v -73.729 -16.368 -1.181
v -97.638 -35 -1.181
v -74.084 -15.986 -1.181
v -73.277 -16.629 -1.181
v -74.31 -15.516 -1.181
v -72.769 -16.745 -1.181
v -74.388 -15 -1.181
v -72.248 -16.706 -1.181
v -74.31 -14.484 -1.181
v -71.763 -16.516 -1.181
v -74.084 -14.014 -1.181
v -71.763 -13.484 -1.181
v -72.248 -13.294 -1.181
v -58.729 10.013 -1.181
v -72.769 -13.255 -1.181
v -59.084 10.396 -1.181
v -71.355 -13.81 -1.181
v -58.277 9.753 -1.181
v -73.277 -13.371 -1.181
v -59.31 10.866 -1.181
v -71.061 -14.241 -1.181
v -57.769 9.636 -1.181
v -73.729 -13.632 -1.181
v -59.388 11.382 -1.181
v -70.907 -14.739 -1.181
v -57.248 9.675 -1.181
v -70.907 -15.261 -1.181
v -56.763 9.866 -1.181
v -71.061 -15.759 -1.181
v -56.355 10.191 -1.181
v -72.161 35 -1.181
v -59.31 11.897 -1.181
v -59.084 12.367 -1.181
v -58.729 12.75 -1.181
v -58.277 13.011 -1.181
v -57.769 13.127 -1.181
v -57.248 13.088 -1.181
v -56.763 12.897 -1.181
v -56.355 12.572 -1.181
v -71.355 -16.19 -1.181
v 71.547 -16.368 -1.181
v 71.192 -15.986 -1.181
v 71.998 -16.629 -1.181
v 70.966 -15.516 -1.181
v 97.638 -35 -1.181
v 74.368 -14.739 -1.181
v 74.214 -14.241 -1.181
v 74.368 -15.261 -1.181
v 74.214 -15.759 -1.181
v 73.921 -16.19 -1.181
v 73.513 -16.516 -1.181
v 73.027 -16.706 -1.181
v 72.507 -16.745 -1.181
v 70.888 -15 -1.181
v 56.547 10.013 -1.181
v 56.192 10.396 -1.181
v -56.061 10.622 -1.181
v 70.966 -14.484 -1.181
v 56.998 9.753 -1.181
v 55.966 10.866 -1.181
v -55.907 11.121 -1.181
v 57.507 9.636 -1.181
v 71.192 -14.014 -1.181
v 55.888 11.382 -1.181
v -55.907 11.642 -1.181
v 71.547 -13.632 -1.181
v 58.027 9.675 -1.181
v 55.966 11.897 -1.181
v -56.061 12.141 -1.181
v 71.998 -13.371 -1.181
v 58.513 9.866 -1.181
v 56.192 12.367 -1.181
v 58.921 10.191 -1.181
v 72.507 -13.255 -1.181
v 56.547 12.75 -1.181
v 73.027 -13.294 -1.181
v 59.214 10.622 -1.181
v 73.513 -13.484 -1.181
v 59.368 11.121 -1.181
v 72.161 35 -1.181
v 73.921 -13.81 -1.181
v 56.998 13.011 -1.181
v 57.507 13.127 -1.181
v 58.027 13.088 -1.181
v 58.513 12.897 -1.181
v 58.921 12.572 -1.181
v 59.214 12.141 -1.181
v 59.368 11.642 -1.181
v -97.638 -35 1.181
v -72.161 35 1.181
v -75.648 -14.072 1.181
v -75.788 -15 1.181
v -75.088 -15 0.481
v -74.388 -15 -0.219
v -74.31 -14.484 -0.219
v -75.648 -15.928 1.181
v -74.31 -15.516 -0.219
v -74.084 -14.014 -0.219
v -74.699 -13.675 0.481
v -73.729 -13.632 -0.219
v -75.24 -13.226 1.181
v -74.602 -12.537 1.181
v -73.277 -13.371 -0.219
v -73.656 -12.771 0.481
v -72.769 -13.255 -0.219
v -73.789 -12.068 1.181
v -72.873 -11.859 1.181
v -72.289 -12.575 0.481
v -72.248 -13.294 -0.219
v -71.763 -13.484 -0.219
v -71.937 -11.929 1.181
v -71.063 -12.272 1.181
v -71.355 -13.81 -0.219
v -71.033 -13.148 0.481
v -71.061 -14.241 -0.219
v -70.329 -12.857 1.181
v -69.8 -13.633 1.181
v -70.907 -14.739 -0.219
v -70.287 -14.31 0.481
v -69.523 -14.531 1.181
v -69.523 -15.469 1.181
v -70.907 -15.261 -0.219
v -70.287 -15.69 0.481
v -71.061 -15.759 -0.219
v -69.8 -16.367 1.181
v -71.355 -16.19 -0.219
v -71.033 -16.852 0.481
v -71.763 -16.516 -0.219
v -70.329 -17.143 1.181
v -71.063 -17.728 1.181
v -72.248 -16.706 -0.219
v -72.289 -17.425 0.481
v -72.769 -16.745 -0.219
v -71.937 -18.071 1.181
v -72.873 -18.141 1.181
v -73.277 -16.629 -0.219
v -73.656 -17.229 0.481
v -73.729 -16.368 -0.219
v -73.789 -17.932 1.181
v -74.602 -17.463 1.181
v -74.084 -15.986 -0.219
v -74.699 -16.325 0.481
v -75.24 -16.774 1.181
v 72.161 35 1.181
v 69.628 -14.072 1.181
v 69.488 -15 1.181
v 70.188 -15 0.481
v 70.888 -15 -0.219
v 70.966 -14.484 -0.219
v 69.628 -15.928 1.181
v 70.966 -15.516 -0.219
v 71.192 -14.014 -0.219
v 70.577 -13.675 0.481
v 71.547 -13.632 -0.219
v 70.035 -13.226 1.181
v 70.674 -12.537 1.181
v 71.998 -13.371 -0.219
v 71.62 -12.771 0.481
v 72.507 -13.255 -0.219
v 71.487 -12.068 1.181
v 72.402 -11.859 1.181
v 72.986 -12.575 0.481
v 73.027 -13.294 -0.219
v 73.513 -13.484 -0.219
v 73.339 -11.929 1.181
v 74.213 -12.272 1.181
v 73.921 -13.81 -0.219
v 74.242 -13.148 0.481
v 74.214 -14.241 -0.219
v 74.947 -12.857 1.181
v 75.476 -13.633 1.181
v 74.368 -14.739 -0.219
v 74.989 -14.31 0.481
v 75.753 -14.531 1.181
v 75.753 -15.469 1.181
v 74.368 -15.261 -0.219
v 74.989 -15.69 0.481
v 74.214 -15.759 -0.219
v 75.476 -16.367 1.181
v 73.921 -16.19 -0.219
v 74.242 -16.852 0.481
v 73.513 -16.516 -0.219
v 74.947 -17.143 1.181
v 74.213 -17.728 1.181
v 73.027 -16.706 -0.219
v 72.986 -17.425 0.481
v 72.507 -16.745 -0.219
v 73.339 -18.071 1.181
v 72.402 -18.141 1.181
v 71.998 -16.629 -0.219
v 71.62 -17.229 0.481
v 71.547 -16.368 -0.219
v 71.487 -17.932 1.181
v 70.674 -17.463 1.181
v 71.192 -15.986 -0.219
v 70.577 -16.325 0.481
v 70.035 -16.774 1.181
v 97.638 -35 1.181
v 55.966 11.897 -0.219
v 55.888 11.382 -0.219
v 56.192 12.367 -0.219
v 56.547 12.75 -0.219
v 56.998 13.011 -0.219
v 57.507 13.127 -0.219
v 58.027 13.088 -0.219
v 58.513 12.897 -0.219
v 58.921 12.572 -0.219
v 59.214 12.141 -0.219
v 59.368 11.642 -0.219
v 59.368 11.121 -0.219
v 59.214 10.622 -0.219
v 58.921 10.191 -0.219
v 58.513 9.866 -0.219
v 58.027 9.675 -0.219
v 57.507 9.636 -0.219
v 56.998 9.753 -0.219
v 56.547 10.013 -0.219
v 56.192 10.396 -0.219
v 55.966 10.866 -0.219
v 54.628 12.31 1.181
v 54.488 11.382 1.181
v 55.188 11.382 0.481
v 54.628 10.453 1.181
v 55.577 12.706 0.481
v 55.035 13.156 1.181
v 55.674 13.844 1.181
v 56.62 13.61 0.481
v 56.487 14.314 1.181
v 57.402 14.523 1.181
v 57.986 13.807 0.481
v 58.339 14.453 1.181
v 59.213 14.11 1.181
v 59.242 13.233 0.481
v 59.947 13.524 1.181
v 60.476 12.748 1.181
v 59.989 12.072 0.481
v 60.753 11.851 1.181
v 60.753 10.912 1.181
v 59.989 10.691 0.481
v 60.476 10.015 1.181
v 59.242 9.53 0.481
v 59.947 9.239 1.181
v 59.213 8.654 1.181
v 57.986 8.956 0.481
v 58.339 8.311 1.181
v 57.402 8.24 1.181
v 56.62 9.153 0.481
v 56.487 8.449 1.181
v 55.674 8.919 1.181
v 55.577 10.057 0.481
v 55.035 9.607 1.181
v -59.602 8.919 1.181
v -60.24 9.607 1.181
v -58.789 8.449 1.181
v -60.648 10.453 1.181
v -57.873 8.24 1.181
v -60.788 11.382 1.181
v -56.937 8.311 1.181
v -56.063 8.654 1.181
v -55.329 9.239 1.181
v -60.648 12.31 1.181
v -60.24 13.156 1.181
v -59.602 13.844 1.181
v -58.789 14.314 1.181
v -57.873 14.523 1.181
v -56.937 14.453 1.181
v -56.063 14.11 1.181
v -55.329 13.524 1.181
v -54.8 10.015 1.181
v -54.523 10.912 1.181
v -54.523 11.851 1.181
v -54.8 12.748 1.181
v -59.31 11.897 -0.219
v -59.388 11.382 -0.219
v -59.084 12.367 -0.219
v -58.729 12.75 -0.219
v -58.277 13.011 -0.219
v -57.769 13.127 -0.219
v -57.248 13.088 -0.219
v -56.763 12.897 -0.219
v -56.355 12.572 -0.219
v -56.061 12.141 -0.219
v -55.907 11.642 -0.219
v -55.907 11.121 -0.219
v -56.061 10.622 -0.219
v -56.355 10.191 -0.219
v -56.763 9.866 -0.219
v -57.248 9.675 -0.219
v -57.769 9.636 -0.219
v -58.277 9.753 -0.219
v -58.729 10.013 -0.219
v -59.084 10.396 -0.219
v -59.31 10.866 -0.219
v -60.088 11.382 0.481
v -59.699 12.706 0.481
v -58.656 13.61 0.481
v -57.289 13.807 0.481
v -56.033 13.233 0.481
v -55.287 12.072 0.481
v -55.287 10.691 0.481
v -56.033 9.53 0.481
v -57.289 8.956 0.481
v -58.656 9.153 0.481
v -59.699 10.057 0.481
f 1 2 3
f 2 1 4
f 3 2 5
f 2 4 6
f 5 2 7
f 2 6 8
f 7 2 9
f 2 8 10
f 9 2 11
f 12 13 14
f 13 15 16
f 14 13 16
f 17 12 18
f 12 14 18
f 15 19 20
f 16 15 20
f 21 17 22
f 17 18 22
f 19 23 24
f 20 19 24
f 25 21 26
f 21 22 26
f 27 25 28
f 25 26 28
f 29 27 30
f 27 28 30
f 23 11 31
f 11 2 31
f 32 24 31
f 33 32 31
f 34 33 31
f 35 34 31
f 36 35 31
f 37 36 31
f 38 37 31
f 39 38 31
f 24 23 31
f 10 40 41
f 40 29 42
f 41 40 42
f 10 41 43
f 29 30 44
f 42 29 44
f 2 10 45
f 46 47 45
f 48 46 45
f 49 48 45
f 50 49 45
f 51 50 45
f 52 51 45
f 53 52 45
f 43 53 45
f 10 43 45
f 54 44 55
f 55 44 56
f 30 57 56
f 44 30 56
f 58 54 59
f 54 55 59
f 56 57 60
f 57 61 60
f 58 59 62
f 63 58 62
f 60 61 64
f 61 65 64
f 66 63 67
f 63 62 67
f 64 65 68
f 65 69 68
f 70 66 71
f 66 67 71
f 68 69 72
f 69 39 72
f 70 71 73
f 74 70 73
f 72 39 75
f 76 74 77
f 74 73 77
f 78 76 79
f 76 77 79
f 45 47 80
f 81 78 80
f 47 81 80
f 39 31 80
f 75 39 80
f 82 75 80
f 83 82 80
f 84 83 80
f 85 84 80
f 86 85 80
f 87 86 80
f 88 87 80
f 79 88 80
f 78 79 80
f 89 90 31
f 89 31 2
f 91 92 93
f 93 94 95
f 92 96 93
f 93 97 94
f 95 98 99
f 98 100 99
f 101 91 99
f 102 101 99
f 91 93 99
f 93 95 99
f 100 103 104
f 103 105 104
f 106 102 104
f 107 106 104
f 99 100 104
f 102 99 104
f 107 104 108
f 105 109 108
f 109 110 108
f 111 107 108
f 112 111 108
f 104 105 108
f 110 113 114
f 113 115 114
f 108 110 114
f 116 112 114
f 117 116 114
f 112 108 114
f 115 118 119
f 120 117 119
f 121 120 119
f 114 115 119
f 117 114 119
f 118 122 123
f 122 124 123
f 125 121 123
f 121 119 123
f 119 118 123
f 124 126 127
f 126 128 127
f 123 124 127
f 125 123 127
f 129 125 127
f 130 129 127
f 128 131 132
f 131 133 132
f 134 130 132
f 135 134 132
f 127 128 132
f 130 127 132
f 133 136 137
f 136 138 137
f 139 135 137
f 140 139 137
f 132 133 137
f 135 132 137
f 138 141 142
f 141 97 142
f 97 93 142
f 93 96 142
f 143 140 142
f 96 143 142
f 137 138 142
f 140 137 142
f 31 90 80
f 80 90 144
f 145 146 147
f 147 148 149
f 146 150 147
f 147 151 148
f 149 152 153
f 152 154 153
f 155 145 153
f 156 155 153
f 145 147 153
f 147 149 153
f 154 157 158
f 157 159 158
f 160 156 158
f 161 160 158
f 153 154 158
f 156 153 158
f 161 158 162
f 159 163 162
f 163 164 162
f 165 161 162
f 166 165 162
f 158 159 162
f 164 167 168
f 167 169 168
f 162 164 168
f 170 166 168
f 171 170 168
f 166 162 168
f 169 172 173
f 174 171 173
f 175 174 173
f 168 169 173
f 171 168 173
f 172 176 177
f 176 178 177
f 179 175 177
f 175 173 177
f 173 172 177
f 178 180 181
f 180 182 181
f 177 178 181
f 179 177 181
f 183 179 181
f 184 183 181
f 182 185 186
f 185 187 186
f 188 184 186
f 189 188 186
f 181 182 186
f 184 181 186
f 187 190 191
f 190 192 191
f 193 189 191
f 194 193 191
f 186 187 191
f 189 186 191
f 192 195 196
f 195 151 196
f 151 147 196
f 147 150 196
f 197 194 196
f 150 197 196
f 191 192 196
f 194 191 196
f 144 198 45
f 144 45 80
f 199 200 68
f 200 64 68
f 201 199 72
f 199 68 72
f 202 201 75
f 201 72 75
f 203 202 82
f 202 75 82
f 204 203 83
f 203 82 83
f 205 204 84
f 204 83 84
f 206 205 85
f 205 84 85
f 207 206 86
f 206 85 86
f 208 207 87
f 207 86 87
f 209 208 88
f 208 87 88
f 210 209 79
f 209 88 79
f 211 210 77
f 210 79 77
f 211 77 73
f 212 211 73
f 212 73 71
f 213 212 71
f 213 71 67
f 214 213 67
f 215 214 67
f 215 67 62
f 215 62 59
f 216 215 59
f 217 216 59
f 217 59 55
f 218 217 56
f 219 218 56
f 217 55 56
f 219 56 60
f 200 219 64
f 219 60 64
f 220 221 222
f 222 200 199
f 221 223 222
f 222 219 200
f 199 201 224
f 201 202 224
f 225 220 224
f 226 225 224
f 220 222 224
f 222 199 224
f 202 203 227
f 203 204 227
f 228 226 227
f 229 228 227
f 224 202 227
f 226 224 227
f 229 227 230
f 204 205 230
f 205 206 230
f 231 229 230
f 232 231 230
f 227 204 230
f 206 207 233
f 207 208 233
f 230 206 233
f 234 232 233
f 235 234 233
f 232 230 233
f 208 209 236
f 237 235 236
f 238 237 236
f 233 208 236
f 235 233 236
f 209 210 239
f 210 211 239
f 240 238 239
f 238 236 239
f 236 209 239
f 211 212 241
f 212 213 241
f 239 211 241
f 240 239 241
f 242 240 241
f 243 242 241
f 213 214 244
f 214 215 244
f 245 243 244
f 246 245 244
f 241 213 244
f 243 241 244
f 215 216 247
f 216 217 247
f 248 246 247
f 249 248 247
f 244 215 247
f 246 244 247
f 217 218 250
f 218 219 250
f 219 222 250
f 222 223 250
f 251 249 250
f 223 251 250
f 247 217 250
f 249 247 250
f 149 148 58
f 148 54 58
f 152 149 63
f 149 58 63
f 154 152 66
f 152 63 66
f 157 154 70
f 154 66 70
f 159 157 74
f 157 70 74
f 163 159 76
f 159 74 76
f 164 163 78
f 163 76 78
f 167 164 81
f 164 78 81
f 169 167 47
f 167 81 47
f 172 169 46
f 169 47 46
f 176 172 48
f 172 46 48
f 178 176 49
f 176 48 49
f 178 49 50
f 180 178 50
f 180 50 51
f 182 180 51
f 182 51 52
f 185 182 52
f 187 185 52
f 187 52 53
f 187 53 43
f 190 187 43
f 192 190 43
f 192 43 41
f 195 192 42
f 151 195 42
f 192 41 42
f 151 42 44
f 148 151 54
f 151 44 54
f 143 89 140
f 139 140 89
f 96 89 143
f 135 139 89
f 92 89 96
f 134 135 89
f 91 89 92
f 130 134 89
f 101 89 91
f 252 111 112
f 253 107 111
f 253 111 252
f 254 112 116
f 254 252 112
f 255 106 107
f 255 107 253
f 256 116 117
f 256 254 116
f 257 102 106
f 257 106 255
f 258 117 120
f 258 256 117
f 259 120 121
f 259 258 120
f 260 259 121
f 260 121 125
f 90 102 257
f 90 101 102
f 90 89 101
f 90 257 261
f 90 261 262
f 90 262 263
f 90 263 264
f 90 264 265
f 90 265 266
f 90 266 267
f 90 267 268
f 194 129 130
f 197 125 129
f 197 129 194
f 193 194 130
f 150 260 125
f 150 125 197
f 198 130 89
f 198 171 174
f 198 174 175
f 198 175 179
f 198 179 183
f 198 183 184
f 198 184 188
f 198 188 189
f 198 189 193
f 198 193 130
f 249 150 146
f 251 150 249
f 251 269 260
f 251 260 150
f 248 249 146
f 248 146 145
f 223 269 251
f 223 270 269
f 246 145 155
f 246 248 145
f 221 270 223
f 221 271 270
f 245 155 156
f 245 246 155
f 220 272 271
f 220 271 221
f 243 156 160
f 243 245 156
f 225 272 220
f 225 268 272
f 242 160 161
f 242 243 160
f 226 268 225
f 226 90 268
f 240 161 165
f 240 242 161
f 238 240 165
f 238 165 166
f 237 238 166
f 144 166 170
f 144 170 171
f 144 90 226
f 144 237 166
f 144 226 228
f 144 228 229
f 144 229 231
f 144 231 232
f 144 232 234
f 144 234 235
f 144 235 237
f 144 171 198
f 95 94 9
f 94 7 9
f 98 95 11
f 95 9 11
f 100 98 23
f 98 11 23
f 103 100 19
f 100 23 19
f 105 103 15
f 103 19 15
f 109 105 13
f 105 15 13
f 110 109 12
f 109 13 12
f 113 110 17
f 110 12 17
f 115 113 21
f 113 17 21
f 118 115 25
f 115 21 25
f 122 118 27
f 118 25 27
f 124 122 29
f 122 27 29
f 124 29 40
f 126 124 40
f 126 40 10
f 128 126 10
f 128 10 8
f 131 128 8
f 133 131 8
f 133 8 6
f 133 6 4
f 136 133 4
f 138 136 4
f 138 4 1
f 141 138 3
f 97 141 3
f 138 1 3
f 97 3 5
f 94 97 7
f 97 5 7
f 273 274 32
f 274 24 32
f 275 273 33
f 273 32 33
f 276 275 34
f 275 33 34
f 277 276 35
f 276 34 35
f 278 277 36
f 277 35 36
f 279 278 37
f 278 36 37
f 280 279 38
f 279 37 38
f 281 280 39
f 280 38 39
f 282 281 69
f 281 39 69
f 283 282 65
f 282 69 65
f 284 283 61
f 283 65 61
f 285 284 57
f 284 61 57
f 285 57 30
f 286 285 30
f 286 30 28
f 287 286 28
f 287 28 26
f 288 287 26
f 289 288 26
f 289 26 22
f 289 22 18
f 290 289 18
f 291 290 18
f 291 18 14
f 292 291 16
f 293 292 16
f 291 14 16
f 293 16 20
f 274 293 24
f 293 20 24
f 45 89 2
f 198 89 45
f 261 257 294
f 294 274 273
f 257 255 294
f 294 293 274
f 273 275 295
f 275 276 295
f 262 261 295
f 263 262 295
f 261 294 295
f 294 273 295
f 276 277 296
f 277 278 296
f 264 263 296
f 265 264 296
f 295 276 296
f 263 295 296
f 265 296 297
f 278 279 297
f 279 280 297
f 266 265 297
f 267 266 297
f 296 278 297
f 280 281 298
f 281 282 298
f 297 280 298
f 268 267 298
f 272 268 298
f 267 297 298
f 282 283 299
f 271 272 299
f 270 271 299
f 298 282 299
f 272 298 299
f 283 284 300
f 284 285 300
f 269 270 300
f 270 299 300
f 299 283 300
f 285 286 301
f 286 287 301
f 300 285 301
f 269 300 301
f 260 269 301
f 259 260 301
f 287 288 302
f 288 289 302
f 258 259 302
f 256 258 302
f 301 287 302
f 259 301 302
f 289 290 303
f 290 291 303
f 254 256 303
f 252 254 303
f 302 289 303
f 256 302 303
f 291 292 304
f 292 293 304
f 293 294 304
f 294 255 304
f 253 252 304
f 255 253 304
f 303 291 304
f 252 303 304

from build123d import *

# Parameters (mm, degrees)
SKETCH1_W                = 195.277
SKETCH1_H                = 70
MAIN_DEPTH               = 1.1811
ANGLECUTS_REACH          = 105.749
BRACKETHOLES_D           = 3.5
BRACKETHOLES_DEPTH       = 5
BRACKETHOLES_CSINK_D     = 6.3
BRACKETHOLES_CSINK_ANGLE = 90


with BuildPart() as part:
    # Sketch1 → Main (new, symmetric)
    with BuildSketch(Plane.XY):
        Rectangle(SKETCH1_W, SKETCH1_H)
    extrude(amount=MAIN_DEPTH, both=True)

    # Sketch2 → AngleCuts (cut, up to next)
    with BuildSketch(Plane.XY.offset(1.1811), mode=Mode.PRIVATE) as anglecuts_sk1:
        Polygon((-97.6385, 35), (-72.160583601, 35), (-97.6385, -35), align=None)
    anglecuts_tool1 = extrude(anglecuts_sk1.sketch, amount=-ANGLECUTS_REACH, mode=Mode.PRIVATE) & part.part
    # Sketch2 → AngleCuts (cut, up to next)
    with BuildSketch(Plane.XY.offset(1.1811), mode=Mode.PRIVATE) as anglecuts_sk2:
        Polygon((97.6385, 35), (97.6385, -35), (72.160583601, 35), align=None)
    anglecuts_tool2 = extrude(anglecuts_sk2.sketch, amount=-ANGLECUTS_REACH, mode=Mode.PRIVATE) & part.part
    add(anglecuts_tool1.solids().sort_by_distance((-89.145861, 11.666667, 1.1811))[0], mode=Mode.SUBTRACT)
    add(anglecuts_tool2.solids().sort_by_distance((89.145861, 11.666667, 1.1811))[0], mode=Mode.SUBTRACT)

    # BracketHoles
    with Locations(Plane.XY.offset(1.1811)):
        with Locations((-72.6378, -15), (-57.6378, 11.3815573), (57.6378, 11.3815573), (72.6378, -15)):
            CounterSinkHole(BRACKETHOLES_D / 2, BRACKETHOLES_CSINK_D / 2, depth=BRACKETHOLES_DEPTH, counter_sink_angle=BRACKETHOLES_CSINK_ANGLE)


solid = part.part
